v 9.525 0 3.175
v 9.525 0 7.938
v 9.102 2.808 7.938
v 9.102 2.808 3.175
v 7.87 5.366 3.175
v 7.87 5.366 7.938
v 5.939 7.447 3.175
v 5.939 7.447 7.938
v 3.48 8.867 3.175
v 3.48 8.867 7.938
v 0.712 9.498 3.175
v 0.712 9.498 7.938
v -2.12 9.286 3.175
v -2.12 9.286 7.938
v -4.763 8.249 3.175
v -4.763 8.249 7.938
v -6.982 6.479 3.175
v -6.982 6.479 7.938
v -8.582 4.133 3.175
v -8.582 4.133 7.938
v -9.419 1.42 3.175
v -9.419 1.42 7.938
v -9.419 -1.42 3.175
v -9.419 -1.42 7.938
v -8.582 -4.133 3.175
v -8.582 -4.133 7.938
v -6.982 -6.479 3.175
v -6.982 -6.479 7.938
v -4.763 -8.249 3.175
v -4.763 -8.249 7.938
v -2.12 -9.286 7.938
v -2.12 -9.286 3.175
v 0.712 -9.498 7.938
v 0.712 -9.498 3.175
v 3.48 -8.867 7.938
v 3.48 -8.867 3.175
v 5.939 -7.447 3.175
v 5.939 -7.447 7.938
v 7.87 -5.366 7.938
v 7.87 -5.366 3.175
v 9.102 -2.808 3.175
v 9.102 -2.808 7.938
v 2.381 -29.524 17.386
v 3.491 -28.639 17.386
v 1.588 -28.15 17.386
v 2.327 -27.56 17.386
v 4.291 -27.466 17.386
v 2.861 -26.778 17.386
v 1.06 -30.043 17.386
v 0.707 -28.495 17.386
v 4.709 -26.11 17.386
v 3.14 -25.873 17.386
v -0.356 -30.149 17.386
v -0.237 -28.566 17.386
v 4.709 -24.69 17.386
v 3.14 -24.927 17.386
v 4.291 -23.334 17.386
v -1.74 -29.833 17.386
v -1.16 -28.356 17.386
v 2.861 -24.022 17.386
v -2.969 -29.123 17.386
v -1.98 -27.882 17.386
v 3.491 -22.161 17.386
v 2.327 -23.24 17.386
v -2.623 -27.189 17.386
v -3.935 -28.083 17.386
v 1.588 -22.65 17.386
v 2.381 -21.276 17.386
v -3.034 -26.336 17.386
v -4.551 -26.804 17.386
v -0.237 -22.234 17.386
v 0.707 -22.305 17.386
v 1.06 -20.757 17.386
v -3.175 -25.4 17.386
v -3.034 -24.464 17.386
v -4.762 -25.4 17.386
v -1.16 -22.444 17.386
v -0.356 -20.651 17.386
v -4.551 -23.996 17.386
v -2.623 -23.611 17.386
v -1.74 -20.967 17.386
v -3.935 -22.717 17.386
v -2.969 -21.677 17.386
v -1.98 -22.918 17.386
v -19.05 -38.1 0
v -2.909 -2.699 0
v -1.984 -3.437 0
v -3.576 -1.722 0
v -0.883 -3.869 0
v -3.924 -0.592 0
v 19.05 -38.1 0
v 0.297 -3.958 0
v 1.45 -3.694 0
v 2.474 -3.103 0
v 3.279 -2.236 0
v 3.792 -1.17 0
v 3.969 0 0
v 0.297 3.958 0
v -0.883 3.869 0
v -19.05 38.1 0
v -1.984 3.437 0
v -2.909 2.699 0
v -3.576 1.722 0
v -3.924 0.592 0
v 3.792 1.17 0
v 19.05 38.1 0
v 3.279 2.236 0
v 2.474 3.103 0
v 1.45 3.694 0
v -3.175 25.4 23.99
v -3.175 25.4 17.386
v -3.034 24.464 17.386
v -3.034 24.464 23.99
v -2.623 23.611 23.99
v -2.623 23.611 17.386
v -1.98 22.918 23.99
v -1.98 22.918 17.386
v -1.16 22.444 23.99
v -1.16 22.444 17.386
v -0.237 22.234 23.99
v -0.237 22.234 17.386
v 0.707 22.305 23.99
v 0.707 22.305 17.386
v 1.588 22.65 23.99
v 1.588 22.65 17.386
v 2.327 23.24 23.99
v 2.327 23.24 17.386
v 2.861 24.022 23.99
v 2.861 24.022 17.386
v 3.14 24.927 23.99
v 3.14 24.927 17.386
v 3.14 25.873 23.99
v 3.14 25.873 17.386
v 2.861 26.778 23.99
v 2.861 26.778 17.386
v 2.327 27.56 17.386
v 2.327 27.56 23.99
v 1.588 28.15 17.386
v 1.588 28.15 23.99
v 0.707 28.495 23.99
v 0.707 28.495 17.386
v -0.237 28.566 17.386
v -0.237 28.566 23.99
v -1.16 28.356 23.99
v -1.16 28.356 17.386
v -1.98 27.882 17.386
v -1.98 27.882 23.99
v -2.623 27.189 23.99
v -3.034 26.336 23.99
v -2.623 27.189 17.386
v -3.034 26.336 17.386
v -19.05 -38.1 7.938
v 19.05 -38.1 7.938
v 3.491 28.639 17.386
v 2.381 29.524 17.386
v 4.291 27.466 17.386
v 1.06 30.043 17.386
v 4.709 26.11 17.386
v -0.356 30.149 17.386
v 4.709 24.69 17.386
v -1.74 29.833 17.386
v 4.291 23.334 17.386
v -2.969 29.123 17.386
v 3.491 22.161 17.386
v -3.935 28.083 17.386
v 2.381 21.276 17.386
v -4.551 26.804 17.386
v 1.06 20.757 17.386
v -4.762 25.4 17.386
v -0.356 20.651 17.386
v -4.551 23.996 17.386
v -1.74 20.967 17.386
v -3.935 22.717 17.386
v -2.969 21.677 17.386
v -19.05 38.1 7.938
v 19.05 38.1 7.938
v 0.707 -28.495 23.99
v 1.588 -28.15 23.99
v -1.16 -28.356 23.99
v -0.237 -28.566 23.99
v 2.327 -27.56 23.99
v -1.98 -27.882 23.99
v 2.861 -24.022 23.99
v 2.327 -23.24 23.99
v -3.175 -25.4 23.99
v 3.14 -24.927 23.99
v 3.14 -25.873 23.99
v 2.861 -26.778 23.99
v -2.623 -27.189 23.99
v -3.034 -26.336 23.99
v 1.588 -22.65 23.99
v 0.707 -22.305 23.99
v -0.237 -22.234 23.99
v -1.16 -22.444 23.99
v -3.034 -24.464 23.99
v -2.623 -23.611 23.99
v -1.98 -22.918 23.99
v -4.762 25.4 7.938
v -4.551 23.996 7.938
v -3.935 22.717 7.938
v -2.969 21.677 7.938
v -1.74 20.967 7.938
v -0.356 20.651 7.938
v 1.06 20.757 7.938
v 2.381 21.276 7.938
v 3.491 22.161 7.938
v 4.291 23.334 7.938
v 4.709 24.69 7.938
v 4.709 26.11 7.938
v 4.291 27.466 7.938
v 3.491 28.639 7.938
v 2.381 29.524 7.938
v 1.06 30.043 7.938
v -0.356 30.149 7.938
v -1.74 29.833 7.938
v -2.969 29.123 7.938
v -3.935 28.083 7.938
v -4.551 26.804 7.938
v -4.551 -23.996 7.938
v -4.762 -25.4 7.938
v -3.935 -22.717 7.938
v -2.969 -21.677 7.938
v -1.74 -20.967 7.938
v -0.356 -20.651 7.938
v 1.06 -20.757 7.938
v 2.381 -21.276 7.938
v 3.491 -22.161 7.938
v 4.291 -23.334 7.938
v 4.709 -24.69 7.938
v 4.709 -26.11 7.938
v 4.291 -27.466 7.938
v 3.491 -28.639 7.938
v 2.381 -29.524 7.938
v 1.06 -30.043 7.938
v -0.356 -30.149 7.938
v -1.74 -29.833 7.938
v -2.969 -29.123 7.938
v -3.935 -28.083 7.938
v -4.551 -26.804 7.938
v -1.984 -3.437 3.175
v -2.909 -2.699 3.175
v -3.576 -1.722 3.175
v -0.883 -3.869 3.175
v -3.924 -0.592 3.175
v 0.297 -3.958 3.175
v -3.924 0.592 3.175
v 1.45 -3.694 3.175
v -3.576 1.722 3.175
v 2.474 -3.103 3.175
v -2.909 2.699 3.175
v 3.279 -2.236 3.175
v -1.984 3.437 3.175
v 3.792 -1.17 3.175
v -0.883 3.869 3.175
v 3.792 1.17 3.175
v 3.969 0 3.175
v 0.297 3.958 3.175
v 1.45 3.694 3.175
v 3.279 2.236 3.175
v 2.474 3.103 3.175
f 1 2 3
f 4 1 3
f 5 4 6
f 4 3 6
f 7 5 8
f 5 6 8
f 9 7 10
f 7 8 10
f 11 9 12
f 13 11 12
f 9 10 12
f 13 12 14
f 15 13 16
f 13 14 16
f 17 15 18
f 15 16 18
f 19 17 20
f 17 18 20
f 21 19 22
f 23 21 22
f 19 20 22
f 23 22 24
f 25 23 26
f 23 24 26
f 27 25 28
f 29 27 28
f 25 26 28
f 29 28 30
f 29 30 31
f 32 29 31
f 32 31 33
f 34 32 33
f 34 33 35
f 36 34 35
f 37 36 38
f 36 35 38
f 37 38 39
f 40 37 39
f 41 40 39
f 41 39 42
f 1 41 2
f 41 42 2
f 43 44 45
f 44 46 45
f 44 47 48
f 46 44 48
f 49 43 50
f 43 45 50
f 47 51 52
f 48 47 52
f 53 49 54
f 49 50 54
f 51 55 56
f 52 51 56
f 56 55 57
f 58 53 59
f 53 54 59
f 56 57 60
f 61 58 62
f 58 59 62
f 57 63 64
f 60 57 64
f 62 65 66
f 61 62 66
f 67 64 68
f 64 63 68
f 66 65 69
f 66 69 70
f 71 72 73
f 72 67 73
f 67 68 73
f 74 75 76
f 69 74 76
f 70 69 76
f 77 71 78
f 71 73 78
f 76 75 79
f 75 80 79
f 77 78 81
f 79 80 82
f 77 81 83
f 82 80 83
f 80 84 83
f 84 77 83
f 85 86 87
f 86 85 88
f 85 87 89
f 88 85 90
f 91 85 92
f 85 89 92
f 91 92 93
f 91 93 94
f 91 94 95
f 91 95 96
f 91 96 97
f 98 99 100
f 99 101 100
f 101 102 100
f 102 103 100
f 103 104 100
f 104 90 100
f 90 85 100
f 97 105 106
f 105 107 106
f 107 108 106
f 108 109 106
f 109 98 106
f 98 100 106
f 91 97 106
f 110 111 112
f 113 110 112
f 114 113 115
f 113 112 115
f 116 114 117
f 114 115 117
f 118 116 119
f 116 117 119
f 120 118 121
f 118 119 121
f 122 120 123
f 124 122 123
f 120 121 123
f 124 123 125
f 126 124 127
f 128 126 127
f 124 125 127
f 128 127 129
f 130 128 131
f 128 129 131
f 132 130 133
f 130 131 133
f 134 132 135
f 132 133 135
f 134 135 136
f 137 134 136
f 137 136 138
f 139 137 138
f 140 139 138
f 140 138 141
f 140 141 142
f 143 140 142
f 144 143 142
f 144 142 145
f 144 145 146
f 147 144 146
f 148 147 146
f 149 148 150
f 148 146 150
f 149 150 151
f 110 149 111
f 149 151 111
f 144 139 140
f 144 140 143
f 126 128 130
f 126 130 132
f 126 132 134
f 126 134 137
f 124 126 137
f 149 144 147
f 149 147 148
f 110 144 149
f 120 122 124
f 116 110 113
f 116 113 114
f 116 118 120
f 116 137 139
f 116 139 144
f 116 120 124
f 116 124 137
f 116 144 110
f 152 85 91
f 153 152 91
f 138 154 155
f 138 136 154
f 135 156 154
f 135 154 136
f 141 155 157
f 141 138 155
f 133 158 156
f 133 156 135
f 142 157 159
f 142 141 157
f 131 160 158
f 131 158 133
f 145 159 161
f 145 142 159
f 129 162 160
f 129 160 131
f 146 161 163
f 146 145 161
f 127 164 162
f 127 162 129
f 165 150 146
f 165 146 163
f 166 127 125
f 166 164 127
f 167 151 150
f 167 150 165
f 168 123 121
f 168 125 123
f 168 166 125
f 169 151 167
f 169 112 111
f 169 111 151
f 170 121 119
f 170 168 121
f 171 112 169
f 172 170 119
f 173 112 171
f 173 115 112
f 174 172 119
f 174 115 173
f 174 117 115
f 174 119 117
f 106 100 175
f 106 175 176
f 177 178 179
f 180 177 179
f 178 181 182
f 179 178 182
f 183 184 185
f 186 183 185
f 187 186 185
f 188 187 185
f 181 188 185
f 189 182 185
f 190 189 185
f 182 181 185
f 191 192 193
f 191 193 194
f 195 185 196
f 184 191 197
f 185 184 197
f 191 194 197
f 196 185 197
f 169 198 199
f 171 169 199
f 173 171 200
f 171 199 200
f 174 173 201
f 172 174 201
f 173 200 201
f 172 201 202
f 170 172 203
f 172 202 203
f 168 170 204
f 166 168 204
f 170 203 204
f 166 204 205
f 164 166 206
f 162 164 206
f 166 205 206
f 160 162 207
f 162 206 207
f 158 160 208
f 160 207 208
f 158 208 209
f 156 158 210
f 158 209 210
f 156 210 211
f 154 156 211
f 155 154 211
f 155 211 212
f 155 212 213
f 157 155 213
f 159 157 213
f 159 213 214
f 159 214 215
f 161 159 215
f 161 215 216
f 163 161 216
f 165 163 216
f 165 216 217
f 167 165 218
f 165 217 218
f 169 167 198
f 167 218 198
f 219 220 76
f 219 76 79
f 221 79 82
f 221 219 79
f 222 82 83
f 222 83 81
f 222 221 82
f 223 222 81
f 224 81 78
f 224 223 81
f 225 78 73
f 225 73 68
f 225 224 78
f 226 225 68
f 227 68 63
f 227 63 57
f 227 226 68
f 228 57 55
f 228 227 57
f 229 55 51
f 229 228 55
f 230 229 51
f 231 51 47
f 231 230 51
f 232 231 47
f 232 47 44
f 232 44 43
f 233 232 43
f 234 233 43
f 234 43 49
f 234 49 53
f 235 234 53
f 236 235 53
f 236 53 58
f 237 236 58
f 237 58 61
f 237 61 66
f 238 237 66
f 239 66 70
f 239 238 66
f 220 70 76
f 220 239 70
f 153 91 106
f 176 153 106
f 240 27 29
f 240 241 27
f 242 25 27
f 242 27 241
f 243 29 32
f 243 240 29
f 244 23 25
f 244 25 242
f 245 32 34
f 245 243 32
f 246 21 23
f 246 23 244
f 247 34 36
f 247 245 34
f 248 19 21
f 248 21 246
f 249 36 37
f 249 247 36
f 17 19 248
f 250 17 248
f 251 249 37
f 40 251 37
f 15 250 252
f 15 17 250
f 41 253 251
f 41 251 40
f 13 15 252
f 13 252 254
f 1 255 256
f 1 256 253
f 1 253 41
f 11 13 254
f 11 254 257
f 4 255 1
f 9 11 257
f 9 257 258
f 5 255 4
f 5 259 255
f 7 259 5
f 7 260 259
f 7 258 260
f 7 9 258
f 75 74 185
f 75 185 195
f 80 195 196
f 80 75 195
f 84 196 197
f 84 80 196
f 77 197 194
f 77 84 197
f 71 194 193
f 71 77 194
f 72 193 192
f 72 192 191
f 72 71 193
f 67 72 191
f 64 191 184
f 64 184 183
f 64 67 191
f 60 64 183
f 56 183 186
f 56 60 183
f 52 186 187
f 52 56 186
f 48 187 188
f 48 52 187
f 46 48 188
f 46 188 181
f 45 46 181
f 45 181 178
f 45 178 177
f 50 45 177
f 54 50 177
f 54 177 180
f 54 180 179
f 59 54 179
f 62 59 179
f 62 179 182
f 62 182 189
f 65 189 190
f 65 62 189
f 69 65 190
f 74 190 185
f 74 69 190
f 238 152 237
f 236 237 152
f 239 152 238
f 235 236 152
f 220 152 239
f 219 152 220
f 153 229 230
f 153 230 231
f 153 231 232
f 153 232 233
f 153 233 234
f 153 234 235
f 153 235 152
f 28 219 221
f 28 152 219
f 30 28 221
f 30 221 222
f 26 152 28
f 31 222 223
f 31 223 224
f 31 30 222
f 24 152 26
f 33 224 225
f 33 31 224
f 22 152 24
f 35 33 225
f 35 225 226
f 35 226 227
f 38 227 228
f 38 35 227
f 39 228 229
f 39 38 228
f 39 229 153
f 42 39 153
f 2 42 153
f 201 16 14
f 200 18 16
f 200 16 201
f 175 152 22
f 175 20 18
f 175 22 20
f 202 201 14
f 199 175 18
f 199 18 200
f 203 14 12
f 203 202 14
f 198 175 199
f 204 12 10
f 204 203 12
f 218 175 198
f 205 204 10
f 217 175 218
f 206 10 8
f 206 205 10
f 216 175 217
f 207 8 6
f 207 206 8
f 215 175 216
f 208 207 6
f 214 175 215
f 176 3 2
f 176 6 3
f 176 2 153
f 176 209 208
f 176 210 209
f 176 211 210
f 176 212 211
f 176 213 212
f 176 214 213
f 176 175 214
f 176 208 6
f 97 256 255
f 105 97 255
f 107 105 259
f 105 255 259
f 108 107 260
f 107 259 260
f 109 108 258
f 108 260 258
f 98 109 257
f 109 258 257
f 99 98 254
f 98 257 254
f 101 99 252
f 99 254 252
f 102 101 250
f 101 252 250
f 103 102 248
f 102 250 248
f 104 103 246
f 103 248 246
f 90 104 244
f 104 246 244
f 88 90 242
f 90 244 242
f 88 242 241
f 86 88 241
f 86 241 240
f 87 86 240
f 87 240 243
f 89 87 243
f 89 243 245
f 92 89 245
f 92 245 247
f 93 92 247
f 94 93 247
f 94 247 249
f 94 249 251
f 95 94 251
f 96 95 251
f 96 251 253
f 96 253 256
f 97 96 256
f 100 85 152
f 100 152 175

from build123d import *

# Parameters (mm, degrees)
SKETCH1_W           = 38.1
SKETCH1_H           = 76.2
BOSS_EXTRUDE1_DEPTH = 7.9375
SKETCH2_R           = 3.96875
CUT_EXTRUDE1_DEPTH  = 44.330317403
SKETCH4_R           = 9.525
CUT_EXTRUDE2_DEPTH  = 4.7625
SKETCH5_R           = 4.7625
BOSS_EXTRUDE2_DEPTH = 9.4488
SKETCH6_R           = 3.175
BOSS_EXTRUDE3_DEPTH = 6.604


with BuildPart() as part:
    # Sketch1 → Boss-Extrude1 (new body)
    with BuildSketch(Plane.XY):
        Rectangle(SKETCH1_W, SKETCH1_H)
    extrude(amount=BOSS_EXTRUDE1_DEPTH)

    # Sketch2 → Cut-Extrude1 (cut, through all)
    with BuildSketch(Plane.XY.offset(7.9375)):
        Circle(SKETCH2_R)
    extrude(amount=-CUT_EXTRUDE1_DEPTH, mode=Mode.SUBTRACT)

    # Sketch4 → Cut-Extrude2 (cut)
    with BuildSketch(Plane.XY.offset(7.9375)):
        Circle(SKETCH4_R)
    extrude(amount=-CUT_EXTRUDE2_DEPTH, mode=Mode.SUBTRACT)

    # Sketch5 → Boss-Extrude2 (add)
    with BuildSketch(Plane.XY.offset(7.9375)):
        with Locations(Location((0, 25.4, 0), (0, 0, 180))):
            Circle(SKETCH5_R)
    boss_extrude2 = extrude(amount=BOSS_EXTRUDE2_DEPTH)

    # Sketch6 → Boss-Extrude3 (add)
    with BuildSketch(Plane.XY.offset(17.3863)):
        with Locations(Location((0, 25.4, 0), (0, 0, 180))):
            Circle(SKETCH6_R)
    boss_extrude3 = extrude(amount=BOSS_EXTRUDE3_DEPTH)

    # Mirror1: Boss-Extrude2, Boss-Extrude3 across plane
    add(boss_extrude2.mirror(Plane.ZX))
    add(boss_extrude3.mirror(Plane.ZX))


solid = part.part
